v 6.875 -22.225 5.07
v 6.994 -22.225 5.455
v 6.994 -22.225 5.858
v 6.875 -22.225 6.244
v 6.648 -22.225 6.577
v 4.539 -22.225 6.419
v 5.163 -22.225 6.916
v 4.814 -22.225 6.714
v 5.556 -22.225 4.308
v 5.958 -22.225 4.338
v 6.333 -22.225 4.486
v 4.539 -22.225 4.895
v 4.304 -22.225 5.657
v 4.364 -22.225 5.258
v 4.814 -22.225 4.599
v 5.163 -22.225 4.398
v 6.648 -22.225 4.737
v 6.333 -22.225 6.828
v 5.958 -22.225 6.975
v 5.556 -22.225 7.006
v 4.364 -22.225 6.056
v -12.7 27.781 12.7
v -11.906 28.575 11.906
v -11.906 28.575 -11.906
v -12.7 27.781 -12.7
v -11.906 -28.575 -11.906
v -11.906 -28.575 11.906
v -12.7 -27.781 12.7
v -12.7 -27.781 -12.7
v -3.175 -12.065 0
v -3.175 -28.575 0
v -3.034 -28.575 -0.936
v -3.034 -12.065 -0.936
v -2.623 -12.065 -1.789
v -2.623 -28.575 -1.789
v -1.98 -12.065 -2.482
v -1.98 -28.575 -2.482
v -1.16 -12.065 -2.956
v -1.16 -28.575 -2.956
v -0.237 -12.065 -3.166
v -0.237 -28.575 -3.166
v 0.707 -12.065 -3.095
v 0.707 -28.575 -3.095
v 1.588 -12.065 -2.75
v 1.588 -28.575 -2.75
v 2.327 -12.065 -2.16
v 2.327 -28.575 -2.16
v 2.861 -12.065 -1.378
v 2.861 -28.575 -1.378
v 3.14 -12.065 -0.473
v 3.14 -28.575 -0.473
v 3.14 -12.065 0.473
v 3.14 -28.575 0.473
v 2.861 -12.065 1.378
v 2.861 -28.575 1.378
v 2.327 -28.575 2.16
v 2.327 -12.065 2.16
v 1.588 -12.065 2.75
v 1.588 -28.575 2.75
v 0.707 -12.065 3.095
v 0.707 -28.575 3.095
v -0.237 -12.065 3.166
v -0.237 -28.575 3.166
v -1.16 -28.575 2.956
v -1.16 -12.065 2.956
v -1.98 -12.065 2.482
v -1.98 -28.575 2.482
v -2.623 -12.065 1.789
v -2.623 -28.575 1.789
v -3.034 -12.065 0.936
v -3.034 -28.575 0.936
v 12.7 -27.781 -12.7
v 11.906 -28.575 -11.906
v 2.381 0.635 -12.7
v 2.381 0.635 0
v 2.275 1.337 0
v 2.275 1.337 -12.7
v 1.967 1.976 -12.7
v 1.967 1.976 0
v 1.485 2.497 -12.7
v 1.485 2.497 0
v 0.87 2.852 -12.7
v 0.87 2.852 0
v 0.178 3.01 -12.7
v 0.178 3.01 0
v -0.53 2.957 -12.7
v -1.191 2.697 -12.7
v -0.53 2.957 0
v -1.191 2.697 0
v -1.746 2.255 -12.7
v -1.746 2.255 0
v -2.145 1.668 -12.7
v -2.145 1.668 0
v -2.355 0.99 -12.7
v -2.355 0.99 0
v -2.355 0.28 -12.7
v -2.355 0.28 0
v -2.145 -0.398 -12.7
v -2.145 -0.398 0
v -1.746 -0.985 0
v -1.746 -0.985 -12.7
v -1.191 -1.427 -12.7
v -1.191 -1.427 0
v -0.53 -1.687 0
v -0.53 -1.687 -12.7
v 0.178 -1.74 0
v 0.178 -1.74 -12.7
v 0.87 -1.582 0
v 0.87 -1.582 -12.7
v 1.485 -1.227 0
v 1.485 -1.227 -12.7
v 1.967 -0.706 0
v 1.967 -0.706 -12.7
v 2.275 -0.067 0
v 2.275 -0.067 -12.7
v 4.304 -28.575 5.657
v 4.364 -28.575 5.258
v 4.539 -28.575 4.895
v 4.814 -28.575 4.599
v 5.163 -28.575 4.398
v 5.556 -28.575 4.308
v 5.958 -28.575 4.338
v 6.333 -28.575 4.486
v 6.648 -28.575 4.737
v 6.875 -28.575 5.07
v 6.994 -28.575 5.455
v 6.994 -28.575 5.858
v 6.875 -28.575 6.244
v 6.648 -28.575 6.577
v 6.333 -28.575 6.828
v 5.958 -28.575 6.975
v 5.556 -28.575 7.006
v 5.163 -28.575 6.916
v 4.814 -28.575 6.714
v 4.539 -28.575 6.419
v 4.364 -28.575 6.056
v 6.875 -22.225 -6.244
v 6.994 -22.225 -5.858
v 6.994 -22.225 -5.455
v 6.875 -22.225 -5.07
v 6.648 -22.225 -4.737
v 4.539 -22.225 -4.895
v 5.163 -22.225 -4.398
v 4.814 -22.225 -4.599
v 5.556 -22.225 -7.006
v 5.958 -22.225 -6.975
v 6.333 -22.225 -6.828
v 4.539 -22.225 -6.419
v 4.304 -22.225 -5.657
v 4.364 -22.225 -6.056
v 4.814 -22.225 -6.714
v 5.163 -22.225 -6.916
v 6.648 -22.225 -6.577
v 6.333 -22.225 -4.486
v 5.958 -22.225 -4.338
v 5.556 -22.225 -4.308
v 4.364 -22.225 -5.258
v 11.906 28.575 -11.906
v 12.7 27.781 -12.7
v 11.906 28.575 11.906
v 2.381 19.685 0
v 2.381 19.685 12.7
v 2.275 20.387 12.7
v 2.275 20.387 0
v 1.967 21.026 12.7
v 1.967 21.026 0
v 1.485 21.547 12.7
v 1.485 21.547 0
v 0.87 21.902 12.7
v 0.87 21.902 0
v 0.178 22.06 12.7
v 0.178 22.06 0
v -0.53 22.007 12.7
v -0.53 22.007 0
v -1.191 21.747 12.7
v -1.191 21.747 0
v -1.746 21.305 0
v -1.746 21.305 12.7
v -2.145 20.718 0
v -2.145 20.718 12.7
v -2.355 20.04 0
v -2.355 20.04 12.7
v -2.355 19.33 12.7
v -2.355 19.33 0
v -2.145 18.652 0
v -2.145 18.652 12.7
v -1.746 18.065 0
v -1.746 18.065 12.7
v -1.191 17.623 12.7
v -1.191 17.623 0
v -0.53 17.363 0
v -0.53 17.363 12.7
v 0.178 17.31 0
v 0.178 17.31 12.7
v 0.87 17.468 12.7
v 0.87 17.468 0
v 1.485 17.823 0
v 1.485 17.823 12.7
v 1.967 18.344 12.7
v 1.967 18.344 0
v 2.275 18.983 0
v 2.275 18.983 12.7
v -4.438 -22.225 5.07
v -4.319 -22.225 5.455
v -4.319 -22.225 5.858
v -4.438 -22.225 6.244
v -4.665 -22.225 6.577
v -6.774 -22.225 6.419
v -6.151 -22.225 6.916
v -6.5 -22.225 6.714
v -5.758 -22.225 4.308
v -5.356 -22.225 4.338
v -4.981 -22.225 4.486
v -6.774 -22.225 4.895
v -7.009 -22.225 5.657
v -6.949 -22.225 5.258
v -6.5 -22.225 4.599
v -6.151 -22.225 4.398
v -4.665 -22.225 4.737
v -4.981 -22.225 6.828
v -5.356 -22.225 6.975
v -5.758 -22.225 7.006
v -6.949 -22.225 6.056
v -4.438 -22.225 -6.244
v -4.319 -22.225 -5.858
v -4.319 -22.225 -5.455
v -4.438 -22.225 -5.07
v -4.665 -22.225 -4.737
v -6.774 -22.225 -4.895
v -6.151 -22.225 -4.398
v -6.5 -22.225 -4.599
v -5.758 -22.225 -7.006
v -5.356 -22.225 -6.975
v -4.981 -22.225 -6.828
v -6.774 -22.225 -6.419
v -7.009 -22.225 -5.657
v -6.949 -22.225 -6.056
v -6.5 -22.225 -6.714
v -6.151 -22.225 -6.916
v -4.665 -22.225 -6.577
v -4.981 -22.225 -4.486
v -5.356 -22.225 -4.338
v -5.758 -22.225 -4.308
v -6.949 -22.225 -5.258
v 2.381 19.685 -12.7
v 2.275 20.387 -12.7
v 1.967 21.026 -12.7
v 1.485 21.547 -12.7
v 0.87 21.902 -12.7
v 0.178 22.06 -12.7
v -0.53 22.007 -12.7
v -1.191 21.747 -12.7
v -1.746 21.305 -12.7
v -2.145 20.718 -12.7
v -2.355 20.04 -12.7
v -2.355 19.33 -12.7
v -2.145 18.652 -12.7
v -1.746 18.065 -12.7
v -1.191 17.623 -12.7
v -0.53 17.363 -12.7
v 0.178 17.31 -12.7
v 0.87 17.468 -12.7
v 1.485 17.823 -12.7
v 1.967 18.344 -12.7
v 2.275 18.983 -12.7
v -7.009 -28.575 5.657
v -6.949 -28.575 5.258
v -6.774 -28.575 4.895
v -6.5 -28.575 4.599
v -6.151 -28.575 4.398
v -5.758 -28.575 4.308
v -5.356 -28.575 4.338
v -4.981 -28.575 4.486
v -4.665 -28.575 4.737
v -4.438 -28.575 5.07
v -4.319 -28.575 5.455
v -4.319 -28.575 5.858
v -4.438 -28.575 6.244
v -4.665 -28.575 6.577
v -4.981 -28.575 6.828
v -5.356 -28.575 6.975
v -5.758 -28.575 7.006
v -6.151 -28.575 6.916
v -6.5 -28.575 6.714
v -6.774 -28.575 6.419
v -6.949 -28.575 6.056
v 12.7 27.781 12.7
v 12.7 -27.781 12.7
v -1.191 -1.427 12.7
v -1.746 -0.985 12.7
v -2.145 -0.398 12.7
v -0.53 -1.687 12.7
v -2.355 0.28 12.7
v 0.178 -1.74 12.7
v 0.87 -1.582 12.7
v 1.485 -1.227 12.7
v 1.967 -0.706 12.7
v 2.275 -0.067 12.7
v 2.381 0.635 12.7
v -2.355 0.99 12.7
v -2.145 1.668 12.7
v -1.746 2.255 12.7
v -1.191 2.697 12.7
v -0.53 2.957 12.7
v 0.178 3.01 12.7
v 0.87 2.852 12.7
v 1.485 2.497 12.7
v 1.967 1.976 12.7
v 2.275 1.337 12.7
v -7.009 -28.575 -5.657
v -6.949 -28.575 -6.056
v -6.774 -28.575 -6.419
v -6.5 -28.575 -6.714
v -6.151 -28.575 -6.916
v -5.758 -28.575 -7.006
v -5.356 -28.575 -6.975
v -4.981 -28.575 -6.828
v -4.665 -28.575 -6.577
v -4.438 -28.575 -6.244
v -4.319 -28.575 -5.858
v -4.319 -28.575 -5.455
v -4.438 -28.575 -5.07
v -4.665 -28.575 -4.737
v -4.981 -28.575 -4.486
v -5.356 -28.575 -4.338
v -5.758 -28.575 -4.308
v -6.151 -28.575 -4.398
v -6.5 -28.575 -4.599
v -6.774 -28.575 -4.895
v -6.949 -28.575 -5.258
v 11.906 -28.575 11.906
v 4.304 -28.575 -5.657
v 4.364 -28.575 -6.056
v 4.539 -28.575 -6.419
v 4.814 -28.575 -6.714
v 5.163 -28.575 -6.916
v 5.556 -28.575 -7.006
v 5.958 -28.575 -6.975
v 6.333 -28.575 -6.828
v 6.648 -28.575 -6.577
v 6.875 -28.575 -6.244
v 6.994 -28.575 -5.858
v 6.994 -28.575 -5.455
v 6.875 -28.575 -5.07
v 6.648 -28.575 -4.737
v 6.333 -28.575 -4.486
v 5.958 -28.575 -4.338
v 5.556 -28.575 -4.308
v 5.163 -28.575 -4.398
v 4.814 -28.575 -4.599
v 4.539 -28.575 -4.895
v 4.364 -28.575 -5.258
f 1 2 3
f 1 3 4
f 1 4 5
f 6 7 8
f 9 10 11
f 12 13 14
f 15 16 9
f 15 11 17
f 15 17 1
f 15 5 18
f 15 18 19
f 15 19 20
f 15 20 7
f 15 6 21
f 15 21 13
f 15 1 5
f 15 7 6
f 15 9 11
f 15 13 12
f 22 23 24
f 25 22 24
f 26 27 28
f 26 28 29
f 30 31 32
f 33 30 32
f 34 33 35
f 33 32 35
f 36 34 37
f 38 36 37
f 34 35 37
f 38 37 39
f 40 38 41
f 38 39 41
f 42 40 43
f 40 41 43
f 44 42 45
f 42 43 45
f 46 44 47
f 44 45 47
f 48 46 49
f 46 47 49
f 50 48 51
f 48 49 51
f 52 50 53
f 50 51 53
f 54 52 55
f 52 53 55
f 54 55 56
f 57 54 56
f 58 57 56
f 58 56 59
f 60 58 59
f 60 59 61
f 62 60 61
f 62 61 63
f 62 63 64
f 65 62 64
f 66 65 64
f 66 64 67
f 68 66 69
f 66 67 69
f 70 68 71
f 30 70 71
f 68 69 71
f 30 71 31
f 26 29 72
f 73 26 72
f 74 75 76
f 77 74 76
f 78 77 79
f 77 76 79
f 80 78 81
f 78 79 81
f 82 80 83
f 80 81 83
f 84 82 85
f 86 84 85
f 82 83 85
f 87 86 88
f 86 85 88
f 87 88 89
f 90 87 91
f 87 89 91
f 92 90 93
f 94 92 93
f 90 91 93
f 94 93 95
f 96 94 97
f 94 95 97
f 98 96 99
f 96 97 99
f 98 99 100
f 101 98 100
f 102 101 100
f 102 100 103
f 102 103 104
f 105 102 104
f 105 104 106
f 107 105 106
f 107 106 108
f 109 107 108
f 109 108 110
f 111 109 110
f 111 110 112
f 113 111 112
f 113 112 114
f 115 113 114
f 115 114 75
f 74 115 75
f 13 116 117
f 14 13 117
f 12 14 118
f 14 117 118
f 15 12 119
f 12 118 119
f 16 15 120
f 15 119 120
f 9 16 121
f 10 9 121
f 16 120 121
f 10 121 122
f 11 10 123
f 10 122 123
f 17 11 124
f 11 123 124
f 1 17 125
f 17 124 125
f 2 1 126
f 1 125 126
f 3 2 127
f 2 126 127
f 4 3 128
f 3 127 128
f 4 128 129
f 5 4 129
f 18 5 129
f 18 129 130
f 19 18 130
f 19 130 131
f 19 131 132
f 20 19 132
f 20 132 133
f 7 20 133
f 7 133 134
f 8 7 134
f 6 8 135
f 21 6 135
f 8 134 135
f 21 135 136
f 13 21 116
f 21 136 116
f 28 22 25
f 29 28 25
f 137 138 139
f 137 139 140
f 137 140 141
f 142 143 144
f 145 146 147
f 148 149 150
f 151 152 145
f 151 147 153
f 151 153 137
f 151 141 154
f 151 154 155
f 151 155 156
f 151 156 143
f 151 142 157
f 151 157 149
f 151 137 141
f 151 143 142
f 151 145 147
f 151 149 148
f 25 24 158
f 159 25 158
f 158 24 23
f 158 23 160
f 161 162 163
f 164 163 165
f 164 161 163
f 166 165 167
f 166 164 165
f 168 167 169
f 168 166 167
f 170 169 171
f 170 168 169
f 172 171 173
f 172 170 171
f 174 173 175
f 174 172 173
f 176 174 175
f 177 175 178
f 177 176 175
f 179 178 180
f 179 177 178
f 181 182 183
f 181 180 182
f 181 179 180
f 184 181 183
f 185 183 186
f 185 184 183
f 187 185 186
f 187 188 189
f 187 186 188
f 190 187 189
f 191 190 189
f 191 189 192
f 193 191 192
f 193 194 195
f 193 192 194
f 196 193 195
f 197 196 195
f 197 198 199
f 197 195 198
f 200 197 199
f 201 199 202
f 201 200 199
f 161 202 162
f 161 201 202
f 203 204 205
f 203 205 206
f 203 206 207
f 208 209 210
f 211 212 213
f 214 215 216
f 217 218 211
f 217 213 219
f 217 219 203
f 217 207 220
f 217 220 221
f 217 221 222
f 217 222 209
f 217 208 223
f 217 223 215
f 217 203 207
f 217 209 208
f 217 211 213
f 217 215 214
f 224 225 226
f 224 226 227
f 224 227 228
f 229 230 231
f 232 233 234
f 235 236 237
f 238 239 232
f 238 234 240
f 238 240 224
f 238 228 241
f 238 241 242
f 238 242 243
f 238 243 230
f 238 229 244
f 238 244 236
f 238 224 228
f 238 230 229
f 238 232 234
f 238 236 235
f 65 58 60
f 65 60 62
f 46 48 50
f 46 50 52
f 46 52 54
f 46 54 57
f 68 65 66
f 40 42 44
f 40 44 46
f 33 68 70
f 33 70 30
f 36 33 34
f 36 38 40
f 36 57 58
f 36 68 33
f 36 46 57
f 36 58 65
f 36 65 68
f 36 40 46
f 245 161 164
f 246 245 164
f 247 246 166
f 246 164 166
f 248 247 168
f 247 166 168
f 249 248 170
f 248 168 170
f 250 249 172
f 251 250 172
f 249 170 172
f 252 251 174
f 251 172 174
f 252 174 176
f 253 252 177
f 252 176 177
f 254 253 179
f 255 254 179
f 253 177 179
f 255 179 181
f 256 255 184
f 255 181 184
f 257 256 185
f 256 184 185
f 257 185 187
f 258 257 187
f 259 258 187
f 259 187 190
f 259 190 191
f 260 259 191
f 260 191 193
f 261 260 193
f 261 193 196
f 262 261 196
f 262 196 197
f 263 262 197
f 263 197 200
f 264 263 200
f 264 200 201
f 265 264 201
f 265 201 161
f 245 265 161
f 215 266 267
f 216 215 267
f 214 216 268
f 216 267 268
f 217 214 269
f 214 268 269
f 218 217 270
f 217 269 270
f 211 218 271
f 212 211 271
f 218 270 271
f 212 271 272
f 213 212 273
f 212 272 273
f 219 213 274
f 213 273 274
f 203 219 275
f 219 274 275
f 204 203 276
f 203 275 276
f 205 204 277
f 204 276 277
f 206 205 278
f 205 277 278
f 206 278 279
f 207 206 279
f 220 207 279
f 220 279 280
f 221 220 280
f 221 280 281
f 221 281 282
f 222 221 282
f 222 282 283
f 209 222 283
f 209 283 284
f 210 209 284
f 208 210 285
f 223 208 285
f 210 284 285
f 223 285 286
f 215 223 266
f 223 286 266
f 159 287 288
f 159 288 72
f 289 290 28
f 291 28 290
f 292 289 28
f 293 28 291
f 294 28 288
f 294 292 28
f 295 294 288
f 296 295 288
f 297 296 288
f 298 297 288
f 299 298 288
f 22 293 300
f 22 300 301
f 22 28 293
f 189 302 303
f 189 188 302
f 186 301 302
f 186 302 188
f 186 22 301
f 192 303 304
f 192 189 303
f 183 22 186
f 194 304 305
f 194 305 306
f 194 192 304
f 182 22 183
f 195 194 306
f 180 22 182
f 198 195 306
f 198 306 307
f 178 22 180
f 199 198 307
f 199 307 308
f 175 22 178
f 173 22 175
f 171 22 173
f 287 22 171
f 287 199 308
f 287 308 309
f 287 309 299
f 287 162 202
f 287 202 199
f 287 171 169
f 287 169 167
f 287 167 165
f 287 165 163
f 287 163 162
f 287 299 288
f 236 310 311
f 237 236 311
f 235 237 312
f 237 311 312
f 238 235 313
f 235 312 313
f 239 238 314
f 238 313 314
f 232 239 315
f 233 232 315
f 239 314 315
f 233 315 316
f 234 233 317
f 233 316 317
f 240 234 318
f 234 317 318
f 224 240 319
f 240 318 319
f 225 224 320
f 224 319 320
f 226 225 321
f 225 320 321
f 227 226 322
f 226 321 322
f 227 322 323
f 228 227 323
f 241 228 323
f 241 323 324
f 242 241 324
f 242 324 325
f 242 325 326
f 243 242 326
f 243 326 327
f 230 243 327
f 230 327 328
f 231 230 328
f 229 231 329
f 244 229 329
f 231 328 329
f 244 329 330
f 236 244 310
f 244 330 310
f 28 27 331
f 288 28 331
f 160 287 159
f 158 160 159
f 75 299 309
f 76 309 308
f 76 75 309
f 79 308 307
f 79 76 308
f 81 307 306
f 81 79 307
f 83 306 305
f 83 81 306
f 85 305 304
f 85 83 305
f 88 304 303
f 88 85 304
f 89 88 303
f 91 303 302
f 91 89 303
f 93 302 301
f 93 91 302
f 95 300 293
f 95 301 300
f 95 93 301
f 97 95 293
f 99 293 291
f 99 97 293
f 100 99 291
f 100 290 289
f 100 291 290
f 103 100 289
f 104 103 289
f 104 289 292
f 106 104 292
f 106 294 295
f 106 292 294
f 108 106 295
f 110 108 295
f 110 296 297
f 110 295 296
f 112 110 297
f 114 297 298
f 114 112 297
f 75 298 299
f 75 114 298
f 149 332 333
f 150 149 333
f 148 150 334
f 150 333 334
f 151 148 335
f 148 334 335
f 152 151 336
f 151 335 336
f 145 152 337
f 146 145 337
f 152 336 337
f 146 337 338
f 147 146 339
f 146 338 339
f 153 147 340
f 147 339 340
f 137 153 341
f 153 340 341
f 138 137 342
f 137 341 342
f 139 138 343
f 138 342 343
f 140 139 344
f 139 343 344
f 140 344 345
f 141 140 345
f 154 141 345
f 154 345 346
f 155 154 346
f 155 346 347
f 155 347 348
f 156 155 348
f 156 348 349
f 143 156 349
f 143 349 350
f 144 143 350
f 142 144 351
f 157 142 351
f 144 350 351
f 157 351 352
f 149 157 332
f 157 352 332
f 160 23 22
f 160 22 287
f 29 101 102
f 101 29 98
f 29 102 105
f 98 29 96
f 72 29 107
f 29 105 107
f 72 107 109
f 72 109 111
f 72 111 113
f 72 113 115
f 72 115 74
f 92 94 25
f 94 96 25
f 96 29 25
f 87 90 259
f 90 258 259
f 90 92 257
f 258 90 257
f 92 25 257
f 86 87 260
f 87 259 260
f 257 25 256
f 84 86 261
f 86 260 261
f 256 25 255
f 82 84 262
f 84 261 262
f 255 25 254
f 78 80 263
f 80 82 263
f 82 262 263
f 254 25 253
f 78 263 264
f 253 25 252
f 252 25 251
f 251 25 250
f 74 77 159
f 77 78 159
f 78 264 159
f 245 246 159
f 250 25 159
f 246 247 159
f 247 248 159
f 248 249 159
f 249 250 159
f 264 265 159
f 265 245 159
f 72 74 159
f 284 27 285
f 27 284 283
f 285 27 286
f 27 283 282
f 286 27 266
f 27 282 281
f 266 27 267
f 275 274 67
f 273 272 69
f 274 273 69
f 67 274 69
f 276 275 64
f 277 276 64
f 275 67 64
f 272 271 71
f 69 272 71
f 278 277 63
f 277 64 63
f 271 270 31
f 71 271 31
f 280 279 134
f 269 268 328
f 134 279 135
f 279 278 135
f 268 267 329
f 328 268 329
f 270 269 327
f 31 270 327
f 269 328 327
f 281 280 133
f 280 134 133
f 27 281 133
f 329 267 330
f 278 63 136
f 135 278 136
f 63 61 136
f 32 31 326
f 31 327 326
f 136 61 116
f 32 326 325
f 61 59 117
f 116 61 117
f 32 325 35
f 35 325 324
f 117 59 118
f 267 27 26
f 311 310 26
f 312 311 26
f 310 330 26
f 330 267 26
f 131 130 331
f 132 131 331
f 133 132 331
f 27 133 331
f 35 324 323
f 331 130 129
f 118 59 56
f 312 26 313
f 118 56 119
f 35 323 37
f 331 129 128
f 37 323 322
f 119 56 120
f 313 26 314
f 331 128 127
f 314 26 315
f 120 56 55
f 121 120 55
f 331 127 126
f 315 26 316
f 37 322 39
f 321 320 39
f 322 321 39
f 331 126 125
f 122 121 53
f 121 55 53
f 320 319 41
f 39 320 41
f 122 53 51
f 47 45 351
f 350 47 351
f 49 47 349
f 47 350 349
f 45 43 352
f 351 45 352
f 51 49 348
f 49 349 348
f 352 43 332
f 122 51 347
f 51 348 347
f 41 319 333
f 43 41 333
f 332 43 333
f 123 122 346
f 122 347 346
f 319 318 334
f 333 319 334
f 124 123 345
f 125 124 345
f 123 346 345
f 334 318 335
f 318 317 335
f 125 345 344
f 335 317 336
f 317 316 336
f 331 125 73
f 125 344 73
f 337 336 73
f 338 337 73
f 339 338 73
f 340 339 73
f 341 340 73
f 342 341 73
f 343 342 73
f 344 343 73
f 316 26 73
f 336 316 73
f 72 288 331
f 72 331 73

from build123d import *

# Parameters (mm, degrees)
SKETCH1_W               = 25.4
SKETCH1_H               = 25.4
BOSS_EXTRUDE1_DEPTH     = 28.575
SKETCH2_R               = 3.175
CUT_EXTRUDE1_DEPTH      = 16.51
SKETCH5_R               = 2.38125
CUT_EXTRUDE3_DEPTH      = 13.7
CUT_EXTRUDE3_DEPTH_BACK = 13.7
CHAMFER1_SIZE           = 0.79375
SKETCH6_R               = 1.35255
CUT_EXTRUDE4_DEPTH      = 6.35


with BuildPart() as part:
    # Sketch1 → Boss-Extrude1 (new body, symmetric)
    with BuildSketch(Plane(origin=(0, 0, 0), x_dir=(1, 0, 0), z_dir=(0, 1, 0))):
        Rectangle(SKETCH1_W, SKETCH1_H)
    extrude(amount=BOSS_EXTRUDE1_DEPTH, both=True)

    # Sketch2 → Cut-Extrude1 (cut)
    with BuildSketch(Plane(origin=(0, -28.575, 0), x_dir=(-1, 0, 0), z_dir=(0, -1, 0))):
        Circle(SKETCH2_R)
    extrude(amount=-CUT_EXTRUDE1_DEPTH, mode=Mode.SUBTRACT)

    # Sketch5 → Cut-Extrude3 (cut, two sides)
    with BuildSketch(Plane.XY) as cut_extrude3_sk:
        with Locations((0, 0.635)):
            Circle(SKETCH5_R)
        with Locations((0, 19.685)):
            Circle(SKETCH5_R)
    extrude(amount=CUT_EXTRUDE3_DEPTH, mode=Mode.SUBTRACT)
    extrude(cut_extrude3_sk.sketch, amount=-CUT_EXTRUDE3_DEPTH_BACK, mode=Mode.SUBTRACT)

    # Chamfer1
    chamfer1_edges = [part.edges().sort_by_distance(p)[0] for p in [
        (-12.7, 28.575, 0),
        (0, 28.575, 12.7),
        (12.7, 28.575, 0),
        (0, -28.575, 12.7),
        (-12.7, -28.575, 0),
        (0, -28.575, -12.7),
        (12.7, -28.575, 0),
        (0, 28.575, -12.7),
    ]]
    chamfer(chamfer1_edges, length=CHAMFER1_SIZE)

    # Sketch6 → Cut-Extrude4 (cut)
    with BuildSketch(Plane(origin=(0, -28.575, 0), x_dir=(-1, 0, 0), z_dir=(0, -1, 0))):
        with Locations((-5.656854249, 5.656854249)):
            Circle(SKETCH6_R)
        with Locations((5.656854249, 5.656854249)):
            Circle(SKETCH6_R)
        with Locations((5.656854249, -5.656854249)):
            Circle(SKETCH6_R)
        with Locations((-5.656854249, -5.656854249)):
            Circle(SKETCH6_R)
    extrude(amount=-CUT_EXTRUDE4_DEPTH, mode=Mode.SUBTRACT)


solid = part.part
